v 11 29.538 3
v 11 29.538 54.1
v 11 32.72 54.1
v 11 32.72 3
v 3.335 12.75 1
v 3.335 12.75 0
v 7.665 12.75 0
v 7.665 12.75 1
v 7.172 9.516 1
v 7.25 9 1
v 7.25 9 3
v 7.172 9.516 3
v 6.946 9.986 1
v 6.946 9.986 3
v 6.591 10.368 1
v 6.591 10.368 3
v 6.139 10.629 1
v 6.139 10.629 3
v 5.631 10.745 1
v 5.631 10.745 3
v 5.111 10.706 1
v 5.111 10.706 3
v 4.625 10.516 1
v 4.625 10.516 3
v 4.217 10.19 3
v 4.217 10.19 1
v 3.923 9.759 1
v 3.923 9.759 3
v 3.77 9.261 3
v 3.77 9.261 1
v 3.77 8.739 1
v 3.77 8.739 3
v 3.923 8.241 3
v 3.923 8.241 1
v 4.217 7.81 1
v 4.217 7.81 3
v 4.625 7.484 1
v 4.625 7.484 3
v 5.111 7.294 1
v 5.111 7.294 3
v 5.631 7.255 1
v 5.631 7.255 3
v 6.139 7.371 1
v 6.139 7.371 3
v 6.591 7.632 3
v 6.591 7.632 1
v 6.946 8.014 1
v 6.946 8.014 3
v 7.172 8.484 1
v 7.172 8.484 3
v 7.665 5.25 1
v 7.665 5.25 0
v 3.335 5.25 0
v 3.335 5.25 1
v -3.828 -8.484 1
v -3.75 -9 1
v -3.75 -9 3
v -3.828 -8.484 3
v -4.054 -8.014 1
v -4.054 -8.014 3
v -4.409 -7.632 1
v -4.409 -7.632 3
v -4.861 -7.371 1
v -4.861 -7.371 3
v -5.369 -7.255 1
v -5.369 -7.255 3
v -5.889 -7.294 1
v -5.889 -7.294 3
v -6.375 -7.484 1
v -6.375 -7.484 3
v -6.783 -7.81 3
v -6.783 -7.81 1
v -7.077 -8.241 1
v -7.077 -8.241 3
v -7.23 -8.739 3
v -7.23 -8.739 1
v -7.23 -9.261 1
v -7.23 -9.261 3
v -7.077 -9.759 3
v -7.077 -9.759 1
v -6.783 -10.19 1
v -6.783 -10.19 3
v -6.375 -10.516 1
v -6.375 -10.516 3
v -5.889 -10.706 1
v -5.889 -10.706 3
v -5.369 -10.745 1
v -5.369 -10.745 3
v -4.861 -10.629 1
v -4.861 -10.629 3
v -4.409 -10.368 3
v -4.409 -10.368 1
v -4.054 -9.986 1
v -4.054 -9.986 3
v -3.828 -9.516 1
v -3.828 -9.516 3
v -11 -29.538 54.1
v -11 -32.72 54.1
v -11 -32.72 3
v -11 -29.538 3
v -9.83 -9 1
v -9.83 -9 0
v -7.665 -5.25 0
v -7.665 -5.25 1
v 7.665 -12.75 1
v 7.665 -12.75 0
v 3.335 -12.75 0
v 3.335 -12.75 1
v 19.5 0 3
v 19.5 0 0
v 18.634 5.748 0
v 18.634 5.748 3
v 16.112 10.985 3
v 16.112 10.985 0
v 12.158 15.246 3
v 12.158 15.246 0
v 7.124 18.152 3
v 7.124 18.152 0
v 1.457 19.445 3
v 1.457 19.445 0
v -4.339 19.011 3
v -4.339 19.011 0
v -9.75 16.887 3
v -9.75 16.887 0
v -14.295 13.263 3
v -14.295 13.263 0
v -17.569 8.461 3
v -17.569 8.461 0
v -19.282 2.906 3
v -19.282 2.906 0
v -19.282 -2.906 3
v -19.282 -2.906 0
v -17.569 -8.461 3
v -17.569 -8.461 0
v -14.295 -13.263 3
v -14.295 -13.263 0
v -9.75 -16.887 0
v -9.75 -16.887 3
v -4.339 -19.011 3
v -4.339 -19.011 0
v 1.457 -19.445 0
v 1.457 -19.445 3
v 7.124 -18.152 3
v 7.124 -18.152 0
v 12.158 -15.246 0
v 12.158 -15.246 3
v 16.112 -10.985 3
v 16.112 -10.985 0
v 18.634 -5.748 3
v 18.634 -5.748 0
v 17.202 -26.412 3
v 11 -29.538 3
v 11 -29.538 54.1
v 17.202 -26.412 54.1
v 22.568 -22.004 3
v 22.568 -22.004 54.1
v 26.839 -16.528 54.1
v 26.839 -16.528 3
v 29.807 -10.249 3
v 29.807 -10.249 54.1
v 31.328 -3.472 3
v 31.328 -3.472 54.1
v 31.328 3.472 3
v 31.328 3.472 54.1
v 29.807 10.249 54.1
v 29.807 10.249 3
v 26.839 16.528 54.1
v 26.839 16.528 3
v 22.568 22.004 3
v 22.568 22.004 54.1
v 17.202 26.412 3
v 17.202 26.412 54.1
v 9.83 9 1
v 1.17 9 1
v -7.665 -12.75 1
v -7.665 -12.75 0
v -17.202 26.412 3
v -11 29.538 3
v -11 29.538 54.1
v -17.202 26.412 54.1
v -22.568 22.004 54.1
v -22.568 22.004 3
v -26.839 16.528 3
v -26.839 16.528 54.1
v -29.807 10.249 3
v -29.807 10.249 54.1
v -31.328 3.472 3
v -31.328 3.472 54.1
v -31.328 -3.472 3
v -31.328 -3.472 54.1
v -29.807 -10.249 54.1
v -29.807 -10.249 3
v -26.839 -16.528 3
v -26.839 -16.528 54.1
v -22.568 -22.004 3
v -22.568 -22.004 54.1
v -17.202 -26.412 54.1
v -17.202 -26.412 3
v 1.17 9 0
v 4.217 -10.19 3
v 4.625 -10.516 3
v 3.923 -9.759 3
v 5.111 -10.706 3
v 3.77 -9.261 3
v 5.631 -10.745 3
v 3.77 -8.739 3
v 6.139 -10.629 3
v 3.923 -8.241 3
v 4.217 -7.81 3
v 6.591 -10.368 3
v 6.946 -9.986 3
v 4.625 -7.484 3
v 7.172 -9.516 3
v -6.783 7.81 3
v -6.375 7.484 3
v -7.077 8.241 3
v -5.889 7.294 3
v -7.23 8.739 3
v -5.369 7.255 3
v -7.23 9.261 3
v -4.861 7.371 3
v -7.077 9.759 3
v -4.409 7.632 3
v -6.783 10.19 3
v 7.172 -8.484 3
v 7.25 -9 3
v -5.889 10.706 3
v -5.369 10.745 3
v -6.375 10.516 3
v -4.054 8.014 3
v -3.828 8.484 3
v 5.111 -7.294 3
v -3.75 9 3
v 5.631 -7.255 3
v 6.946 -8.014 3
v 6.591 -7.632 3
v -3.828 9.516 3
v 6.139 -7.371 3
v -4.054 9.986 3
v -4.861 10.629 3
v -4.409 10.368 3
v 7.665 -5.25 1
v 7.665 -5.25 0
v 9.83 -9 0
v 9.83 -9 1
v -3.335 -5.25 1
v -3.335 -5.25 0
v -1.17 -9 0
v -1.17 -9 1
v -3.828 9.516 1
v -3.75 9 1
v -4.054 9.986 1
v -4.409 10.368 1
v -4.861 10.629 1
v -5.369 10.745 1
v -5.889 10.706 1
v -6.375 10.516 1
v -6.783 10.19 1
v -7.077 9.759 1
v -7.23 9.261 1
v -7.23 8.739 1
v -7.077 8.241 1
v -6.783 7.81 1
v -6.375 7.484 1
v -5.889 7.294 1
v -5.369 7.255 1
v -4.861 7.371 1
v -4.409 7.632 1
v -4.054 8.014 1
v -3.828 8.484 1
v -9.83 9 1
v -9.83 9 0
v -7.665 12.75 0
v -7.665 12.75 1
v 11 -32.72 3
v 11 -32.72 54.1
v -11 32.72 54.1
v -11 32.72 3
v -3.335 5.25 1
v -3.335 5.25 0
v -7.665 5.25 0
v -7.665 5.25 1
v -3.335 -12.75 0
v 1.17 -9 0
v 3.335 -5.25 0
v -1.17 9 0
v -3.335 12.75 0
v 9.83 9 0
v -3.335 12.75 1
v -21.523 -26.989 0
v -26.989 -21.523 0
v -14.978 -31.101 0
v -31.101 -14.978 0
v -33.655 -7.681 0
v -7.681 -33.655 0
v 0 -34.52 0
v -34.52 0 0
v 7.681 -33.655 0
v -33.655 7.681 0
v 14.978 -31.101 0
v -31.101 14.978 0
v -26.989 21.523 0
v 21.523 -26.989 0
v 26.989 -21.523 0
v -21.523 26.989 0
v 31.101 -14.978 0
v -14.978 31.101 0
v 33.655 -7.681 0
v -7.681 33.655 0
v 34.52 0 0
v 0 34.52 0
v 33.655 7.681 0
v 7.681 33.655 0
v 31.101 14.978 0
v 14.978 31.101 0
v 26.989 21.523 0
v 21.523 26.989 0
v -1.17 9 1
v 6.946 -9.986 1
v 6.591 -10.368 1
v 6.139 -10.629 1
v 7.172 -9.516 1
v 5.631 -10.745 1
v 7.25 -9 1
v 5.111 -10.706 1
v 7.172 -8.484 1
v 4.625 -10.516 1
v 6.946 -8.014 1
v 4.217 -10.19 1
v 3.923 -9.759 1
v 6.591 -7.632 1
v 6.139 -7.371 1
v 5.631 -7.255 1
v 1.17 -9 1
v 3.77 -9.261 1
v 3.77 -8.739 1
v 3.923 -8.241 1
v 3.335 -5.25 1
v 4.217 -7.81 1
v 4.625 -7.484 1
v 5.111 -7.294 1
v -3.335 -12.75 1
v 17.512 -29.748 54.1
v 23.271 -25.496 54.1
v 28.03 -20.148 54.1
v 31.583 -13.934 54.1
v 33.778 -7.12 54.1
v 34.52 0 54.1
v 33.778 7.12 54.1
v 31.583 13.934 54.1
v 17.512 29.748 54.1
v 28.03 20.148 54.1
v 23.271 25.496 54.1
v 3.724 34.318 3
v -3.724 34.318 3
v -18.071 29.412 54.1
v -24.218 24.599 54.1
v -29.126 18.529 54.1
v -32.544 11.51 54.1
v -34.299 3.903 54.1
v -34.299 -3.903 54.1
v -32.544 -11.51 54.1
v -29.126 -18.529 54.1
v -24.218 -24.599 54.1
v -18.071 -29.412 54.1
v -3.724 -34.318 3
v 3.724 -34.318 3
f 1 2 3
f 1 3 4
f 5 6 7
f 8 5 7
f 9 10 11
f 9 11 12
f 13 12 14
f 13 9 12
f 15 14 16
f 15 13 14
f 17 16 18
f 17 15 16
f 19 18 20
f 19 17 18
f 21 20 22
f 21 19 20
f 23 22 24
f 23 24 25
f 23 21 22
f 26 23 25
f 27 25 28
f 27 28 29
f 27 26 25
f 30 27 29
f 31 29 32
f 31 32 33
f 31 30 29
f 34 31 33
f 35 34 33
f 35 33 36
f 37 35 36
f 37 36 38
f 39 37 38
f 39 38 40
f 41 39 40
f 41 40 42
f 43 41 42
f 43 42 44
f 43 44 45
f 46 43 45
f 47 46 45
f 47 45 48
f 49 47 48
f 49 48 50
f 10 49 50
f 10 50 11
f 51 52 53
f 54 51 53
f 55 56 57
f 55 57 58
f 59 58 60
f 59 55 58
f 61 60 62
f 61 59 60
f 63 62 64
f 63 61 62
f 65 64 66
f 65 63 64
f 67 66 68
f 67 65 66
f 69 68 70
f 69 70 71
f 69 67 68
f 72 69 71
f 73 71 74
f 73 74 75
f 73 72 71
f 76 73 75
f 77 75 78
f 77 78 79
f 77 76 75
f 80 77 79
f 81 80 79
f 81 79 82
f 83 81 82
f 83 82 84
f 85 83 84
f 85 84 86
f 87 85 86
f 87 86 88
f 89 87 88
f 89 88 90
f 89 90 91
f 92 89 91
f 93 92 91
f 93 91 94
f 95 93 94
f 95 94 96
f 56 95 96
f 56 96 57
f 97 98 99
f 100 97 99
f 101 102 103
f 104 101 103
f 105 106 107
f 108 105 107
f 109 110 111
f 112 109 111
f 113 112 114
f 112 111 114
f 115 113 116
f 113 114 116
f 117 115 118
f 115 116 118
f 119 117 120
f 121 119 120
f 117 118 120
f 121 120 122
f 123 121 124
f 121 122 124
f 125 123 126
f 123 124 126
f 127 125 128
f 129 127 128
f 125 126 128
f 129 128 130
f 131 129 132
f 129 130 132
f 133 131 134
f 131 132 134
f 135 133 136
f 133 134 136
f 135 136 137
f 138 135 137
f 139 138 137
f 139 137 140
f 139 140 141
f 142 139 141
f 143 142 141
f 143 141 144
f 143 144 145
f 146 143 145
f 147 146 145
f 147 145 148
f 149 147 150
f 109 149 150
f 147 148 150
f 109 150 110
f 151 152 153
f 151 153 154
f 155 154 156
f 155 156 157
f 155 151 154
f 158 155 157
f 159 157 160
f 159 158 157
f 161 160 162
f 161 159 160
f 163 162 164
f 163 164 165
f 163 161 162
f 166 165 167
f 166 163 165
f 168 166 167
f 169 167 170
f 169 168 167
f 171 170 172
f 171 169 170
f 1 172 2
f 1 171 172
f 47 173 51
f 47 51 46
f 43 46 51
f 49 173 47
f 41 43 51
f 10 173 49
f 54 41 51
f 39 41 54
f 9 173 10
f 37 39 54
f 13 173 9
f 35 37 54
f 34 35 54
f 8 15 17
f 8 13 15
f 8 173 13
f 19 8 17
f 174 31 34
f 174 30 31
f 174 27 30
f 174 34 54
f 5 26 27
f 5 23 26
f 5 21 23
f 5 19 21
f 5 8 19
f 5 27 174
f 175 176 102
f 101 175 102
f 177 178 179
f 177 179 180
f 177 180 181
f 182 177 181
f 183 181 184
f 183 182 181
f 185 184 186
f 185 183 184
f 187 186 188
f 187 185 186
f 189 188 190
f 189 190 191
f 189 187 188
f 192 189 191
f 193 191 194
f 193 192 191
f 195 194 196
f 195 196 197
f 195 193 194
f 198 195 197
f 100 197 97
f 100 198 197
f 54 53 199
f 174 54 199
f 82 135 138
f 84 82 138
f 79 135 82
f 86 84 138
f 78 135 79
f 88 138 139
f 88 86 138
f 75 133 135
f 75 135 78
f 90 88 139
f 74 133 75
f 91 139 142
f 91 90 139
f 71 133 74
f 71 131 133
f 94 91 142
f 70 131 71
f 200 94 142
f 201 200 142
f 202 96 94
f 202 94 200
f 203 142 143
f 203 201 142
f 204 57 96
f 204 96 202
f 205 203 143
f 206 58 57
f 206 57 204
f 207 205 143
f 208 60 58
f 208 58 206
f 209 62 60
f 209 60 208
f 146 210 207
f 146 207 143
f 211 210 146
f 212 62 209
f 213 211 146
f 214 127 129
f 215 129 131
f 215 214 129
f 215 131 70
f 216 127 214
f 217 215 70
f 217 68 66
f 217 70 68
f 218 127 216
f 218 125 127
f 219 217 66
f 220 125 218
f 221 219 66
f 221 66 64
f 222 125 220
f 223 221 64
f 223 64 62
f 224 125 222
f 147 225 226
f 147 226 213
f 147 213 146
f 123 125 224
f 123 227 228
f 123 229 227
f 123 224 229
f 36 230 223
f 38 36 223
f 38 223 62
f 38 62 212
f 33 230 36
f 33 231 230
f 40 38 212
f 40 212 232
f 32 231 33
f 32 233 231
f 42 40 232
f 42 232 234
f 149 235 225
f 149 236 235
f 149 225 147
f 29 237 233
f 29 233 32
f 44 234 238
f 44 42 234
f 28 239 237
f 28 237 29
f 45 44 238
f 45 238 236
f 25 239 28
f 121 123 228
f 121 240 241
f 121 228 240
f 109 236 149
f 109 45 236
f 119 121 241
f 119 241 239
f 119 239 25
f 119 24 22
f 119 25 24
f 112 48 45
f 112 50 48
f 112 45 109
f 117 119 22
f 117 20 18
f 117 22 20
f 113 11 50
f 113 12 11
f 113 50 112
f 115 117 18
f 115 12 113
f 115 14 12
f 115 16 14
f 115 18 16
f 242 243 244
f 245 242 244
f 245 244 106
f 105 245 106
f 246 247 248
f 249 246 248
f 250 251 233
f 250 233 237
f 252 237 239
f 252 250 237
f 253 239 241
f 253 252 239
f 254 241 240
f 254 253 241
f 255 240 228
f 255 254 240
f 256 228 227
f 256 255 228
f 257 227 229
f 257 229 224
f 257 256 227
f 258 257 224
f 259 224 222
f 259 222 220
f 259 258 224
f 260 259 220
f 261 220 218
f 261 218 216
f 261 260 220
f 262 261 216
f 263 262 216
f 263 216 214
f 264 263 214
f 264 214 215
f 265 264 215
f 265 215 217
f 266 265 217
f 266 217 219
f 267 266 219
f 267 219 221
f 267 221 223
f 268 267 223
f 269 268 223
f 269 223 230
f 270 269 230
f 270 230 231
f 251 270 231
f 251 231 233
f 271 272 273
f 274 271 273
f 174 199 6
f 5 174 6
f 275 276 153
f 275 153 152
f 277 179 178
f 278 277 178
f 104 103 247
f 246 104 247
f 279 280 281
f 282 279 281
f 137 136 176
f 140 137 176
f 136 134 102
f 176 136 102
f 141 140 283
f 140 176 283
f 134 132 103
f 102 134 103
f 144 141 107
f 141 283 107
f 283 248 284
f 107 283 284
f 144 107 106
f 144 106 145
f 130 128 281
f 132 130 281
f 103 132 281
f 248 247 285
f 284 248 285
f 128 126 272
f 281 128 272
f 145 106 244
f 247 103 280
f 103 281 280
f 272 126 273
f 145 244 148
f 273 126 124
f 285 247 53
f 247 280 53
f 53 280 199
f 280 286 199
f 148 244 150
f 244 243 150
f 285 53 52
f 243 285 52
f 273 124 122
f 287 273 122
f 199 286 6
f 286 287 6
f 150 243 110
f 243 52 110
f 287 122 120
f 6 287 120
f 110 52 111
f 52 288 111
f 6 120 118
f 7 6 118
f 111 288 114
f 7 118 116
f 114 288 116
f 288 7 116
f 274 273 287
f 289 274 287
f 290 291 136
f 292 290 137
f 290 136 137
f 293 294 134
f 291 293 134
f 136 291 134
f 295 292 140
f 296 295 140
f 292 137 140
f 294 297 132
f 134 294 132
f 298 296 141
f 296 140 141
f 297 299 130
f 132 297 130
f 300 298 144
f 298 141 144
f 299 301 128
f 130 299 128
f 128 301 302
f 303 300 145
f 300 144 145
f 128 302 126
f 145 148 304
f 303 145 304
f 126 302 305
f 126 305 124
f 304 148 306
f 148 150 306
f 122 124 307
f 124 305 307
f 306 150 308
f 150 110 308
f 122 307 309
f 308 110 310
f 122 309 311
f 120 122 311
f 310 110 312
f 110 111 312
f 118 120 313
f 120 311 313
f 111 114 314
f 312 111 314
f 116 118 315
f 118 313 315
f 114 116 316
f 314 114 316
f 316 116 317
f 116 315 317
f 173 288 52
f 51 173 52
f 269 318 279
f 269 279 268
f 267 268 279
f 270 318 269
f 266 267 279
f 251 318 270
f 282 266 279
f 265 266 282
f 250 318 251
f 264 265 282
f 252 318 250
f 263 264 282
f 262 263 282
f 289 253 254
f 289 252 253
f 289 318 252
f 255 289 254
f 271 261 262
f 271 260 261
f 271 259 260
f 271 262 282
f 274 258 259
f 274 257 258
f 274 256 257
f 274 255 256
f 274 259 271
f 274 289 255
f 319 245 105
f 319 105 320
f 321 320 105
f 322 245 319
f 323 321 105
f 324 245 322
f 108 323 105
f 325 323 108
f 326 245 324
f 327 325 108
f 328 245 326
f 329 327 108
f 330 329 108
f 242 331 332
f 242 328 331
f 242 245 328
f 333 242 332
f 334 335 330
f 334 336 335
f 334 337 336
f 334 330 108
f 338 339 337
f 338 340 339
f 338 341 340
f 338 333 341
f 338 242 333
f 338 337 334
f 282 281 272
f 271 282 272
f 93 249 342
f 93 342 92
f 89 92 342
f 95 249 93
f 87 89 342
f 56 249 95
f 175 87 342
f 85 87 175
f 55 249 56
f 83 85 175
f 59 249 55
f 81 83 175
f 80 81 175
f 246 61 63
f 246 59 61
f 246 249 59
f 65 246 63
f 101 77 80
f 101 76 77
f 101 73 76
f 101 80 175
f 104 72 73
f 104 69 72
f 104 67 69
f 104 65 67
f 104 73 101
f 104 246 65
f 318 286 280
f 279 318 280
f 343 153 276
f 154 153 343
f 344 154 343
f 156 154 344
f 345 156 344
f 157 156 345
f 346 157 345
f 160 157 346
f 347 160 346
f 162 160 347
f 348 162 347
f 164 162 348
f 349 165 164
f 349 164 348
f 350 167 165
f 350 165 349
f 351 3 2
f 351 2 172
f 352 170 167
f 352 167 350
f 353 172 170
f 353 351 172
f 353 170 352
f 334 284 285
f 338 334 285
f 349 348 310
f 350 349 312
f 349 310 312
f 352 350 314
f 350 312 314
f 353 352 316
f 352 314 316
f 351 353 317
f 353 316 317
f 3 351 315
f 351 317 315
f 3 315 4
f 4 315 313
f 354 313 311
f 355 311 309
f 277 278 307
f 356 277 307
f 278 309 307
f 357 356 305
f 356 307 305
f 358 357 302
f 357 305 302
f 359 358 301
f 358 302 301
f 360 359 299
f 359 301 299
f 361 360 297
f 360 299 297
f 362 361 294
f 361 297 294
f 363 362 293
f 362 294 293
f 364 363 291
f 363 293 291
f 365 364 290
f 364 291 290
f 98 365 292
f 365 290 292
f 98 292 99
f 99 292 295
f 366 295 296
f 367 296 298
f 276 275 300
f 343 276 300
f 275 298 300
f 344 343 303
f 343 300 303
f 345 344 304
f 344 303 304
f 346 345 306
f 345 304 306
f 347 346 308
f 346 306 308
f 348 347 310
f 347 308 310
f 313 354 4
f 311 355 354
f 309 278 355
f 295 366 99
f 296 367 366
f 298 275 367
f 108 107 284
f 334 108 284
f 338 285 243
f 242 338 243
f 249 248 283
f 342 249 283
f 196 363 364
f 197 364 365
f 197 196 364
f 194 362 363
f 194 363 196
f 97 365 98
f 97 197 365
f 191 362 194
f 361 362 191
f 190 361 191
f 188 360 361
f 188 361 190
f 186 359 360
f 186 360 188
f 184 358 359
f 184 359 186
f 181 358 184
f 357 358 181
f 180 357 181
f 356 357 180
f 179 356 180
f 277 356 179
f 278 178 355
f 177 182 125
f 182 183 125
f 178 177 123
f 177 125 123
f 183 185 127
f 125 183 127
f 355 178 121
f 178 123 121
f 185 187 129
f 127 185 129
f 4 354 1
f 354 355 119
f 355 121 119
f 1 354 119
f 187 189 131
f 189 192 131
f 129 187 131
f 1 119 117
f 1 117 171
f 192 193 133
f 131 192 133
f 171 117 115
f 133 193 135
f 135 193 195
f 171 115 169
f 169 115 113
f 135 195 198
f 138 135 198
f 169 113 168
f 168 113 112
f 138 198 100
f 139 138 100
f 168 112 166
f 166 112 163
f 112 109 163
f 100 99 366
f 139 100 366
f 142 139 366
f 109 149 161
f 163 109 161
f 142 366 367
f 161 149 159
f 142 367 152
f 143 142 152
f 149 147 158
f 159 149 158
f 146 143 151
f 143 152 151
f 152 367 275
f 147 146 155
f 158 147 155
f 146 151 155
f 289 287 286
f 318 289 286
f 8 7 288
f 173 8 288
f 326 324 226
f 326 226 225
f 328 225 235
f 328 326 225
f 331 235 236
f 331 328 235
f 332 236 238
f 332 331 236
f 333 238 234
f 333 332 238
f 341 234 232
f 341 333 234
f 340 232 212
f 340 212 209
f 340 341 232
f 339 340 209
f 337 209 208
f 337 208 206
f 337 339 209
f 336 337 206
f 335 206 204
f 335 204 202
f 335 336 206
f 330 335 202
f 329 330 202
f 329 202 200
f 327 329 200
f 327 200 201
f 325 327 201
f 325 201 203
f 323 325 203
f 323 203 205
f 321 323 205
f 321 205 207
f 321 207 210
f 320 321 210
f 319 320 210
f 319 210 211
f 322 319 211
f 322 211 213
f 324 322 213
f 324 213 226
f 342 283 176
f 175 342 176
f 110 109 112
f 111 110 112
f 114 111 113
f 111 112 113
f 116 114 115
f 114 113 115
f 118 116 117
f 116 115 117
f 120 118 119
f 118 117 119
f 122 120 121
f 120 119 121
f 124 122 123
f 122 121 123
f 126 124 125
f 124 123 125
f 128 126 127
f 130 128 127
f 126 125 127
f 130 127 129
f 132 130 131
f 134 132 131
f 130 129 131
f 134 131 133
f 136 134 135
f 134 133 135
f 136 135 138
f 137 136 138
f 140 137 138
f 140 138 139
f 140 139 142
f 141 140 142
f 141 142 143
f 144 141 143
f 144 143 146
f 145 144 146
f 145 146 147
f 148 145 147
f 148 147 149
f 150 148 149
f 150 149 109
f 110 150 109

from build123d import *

# Parameters (mm, degrees)
SCHIZZO1_R                    = 19.5
SCHIZZO1_R_2                  = 1.75
ESTRUSIONE_ESTRUSIONE1_DEPTH  = 3
TAGLIO_ESTRUSIONE1_DEPTH      = 1
SCHIZZO5_R                    = 34.52
SCHIZZO5_R_2                  = 19.5
ESTRUSIONE_ESTRUSIONE4_DEPTH  = 3
SCHIZZO6_R                    = 34.52
SCHIZZO6_R_2                  = 31.52
ESTRUSIONE_ESTRUSIONE5_DEPTH  = 51.1
TAGLIO_ESTRUSIONE2_DEPTH      = 73.870232606
TAGLIO_ESTRUSIONE2_DEPTH_BACK = 73.870232606
SCHIZZO7_W                    = 22
SCHIZZO7_H                    = 51.1


with BuildPart() as part:
    # Schizzo1 → Estrusione-Estrusione1 (new body)
    with BuildSketch(Plane.XY):
        Circle(SCHIZZO1_R)
        with Locations((5.5, 9)):
            Circle(SCHIZZO1_R_2, mode=Mode.SUBTRACT)
        with Locations((-5.5, 9)):
            Circle(SCHIZZO1_R_2, mode=Mode.SUBTRACT)
        with Locations((-5.5, -9)):
            Circle(SCHIZZO1_R_2, mode=Mode.SUBTRACT)
        with Locations((5.5, -9)):
            Circle(SCHIZZO1_R_2, mode=Mode.SUBTRACT)
    extrude(amount=ESTRUSIONE_ESTRUSIONE1_DEPTH)

    # Schizzo2 → Taglio-Estrusione1 (cut)
    with BuildSketch(Plane(origin=(0, 0, 0), x_dir=(-1, 0, 0), z_dir=(0, 0, -1))):
        Polygon((7.665063509, 5.25), (9.830127019, 9), (7.665063509, 12.75), (3.334936491, 12.75), (1.169872981, 9), (3.334936491, 5.25), align=None)
        Polygon((3.334936491, -12.75), (7.665063509, -12.75), (9.830127019, -9), (7.665063509, -5.25), (3.334936491, -5.25), (1.169872981, -9), align=None)
        Polygon((-7.665063509, -12.75), (-3.334936491, -12.75), (-1.169872981, -9), (-3.334936491, -5.25), (-7.665063509, -5.25), (-9.830127019, -9), align=None)
        Polygon((-3.334936491, 5.25), (-1.169872981, 9), (-3.334936491, 12.75), (-7.665063509, 12.75), (-9.830127019, 9), (-7.665063509, 5.25), align=None)
    extrude(amount=-TAGLIO_ESTRUSIONE1_DEPTH, mode=Mode.SUBTRACT)


with BuildPart() as body_2:
    # Schizzo5 → Estrusione-Estrusione4 (new body)
    with BuildSketch(Plane.XY.offset(3)):
        Circle(SCHIZZO5_R)
        Circle(SCHIZZO5_R_2, mode=Mode.SUBTRACT)
    extrude(amount=-ESTRUSIONE_ESTRUSIONE4_DEPTH)

    # Schizzo6 → Estrusione-Estrusione5 (add)
    with BuildSketch(Plane.XY.offset(3)):
        Circle(SCHIZZO6_R)
        with Locations(Location((0, 0, 0), (0, 0, 90))):
            Circle(SCHIZZO6_R_2, mode=Mode.SUBTRACT)
    extrude(amount=ESTRUSIONE_ESTRUSIONE5_DEPTH)

    # Schizzo7 → Taglio-Estrusione2 (cut, two sides: drawn at the far end of the back side and taken through both)
    with BuildSketch(Plane(origin=(0, 0, 0), x_dir=(1, 0, 0), z_dir=(0, 1, 0)).offset(-TAGLIO_ESTRUSIONE2_DEPTH_BACK)):
        with Locations((0, -28.55)):
            Rectangle(SCHIZZO7_W, SCHIZZO7_H)
    extrude(amount=TAGLIO_ESTRUSIONE2_DEPTH + TAGLIO_ESTRUSIONE2_DEPTH_BACK, mode=Mode.SUBTRACT)


solid = Compound([part.part, body_2.part])
